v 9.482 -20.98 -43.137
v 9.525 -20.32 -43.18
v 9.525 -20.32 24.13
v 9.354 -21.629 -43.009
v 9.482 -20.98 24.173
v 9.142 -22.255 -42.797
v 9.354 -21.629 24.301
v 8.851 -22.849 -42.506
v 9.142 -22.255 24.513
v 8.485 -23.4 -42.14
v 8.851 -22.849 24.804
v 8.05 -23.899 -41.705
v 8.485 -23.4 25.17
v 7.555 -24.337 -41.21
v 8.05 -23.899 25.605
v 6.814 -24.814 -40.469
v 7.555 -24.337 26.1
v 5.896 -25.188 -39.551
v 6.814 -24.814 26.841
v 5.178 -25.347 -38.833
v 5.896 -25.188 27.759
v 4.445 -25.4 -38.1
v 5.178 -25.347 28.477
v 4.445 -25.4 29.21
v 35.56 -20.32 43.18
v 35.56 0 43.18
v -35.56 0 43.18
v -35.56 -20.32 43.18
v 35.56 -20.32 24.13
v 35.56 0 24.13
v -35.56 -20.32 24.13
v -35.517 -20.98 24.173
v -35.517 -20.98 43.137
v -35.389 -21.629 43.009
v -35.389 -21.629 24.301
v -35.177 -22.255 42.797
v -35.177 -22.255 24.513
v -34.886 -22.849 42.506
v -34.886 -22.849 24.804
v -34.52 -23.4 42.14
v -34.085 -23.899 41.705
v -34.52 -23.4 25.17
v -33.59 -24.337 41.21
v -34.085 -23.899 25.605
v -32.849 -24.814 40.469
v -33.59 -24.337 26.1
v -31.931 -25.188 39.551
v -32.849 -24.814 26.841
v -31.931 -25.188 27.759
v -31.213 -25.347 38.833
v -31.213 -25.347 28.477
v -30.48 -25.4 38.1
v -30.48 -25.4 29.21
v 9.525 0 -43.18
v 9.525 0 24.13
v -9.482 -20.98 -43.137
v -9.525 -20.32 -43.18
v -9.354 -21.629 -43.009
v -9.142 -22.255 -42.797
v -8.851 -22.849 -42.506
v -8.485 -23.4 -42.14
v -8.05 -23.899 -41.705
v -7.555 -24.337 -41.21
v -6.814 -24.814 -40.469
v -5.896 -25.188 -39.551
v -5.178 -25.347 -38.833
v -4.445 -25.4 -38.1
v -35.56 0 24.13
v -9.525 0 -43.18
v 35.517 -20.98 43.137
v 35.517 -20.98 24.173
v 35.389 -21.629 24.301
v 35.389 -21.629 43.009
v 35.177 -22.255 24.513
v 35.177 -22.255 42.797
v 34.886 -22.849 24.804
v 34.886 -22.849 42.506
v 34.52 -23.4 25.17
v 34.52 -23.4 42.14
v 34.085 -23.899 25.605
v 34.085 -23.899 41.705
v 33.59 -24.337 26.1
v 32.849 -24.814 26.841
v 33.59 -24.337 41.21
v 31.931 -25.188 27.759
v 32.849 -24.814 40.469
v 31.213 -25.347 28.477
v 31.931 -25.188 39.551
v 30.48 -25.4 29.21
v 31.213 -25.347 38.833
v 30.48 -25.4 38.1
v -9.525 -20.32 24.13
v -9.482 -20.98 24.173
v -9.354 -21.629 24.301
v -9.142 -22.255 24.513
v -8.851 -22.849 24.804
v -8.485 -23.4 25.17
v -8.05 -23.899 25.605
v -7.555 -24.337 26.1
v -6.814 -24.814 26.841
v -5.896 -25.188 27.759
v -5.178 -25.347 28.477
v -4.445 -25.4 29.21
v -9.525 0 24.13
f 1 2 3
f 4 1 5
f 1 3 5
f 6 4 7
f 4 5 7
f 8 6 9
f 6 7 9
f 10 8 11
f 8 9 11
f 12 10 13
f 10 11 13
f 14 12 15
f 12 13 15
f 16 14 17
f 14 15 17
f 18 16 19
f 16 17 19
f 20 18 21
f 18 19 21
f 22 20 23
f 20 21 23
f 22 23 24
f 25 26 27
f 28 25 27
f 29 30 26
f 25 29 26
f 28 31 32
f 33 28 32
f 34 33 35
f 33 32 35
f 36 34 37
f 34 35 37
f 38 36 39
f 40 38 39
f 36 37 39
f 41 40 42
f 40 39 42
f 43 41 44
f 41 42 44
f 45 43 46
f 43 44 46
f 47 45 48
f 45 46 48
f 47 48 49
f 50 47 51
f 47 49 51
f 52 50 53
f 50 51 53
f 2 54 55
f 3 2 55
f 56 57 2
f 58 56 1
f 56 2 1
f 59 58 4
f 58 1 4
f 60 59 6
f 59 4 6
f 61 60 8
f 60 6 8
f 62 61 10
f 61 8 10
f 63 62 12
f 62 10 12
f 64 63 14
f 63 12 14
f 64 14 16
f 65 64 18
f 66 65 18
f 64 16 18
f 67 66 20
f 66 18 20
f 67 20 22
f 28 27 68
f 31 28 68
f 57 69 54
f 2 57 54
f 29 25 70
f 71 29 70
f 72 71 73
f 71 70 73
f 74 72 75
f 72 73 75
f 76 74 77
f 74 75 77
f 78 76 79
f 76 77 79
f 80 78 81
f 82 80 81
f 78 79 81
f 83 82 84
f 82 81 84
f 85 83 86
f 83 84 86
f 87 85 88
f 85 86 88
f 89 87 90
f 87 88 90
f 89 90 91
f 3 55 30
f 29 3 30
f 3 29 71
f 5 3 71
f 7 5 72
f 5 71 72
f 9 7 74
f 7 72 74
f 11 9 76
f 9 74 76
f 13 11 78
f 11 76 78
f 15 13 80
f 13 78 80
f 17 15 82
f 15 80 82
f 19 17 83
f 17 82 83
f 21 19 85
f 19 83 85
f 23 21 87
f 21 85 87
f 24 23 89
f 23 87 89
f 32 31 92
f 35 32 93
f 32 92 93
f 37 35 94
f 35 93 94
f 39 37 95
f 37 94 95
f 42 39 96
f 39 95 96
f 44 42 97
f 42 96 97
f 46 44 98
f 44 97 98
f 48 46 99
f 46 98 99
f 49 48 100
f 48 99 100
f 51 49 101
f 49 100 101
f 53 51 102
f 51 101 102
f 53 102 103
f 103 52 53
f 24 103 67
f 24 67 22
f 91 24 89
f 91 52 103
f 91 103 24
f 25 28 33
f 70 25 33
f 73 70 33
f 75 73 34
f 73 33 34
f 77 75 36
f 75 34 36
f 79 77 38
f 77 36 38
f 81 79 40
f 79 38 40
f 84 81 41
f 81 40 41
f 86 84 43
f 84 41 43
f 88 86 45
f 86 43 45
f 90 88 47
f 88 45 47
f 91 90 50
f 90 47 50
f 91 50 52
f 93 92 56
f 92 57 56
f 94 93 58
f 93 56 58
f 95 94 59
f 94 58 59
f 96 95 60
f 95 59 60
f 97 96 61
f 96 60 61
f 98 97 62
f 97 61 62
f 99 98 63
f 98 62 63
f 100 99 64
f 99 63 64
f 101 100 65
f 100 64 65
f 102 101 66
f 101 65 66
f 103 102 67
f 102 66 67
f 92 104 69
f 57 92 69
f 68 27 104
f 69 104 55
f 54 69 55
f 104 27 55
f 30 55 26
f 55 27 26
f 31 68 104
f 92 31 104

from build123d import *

# Parameters (mm, degrees)
F1_DEPTH = 25.4
F2_R     = 5.08


with BuildPart() as f1:
    # F0 (on Front) → F1 (new body)
    with BuildSketch(Plane.XZ):
        Polygon((-35.56, 43.18), (-35.56, 24.13), (-9.525, 24.13), (-9.525, -43.18), (9.525, -43.18), (9.525, 24.13), (35.56, 24.13), (35.56, 43.18), align=None)
    extrude(amount=F1_DEPTH)

    # F2
    f2_edges = [f1.edges().sort_by_distance(p)[0] for p in [
        (0, -25.4, 43.18),
        (35.56, -25.4, 33.655),
        (22.5425, -25.4, 24.13),
        (9.525, -25.4, -9.525),
        (0, -25.4, -43.18),
        (-9.525, -25.4, -9.525),
        (-22.5425, -25.4, 24.13),
        (-35.56, -25.4, 33.655),
    ]]
    fillet(f2_edges, radius=F2_R)


solid = f1.part
